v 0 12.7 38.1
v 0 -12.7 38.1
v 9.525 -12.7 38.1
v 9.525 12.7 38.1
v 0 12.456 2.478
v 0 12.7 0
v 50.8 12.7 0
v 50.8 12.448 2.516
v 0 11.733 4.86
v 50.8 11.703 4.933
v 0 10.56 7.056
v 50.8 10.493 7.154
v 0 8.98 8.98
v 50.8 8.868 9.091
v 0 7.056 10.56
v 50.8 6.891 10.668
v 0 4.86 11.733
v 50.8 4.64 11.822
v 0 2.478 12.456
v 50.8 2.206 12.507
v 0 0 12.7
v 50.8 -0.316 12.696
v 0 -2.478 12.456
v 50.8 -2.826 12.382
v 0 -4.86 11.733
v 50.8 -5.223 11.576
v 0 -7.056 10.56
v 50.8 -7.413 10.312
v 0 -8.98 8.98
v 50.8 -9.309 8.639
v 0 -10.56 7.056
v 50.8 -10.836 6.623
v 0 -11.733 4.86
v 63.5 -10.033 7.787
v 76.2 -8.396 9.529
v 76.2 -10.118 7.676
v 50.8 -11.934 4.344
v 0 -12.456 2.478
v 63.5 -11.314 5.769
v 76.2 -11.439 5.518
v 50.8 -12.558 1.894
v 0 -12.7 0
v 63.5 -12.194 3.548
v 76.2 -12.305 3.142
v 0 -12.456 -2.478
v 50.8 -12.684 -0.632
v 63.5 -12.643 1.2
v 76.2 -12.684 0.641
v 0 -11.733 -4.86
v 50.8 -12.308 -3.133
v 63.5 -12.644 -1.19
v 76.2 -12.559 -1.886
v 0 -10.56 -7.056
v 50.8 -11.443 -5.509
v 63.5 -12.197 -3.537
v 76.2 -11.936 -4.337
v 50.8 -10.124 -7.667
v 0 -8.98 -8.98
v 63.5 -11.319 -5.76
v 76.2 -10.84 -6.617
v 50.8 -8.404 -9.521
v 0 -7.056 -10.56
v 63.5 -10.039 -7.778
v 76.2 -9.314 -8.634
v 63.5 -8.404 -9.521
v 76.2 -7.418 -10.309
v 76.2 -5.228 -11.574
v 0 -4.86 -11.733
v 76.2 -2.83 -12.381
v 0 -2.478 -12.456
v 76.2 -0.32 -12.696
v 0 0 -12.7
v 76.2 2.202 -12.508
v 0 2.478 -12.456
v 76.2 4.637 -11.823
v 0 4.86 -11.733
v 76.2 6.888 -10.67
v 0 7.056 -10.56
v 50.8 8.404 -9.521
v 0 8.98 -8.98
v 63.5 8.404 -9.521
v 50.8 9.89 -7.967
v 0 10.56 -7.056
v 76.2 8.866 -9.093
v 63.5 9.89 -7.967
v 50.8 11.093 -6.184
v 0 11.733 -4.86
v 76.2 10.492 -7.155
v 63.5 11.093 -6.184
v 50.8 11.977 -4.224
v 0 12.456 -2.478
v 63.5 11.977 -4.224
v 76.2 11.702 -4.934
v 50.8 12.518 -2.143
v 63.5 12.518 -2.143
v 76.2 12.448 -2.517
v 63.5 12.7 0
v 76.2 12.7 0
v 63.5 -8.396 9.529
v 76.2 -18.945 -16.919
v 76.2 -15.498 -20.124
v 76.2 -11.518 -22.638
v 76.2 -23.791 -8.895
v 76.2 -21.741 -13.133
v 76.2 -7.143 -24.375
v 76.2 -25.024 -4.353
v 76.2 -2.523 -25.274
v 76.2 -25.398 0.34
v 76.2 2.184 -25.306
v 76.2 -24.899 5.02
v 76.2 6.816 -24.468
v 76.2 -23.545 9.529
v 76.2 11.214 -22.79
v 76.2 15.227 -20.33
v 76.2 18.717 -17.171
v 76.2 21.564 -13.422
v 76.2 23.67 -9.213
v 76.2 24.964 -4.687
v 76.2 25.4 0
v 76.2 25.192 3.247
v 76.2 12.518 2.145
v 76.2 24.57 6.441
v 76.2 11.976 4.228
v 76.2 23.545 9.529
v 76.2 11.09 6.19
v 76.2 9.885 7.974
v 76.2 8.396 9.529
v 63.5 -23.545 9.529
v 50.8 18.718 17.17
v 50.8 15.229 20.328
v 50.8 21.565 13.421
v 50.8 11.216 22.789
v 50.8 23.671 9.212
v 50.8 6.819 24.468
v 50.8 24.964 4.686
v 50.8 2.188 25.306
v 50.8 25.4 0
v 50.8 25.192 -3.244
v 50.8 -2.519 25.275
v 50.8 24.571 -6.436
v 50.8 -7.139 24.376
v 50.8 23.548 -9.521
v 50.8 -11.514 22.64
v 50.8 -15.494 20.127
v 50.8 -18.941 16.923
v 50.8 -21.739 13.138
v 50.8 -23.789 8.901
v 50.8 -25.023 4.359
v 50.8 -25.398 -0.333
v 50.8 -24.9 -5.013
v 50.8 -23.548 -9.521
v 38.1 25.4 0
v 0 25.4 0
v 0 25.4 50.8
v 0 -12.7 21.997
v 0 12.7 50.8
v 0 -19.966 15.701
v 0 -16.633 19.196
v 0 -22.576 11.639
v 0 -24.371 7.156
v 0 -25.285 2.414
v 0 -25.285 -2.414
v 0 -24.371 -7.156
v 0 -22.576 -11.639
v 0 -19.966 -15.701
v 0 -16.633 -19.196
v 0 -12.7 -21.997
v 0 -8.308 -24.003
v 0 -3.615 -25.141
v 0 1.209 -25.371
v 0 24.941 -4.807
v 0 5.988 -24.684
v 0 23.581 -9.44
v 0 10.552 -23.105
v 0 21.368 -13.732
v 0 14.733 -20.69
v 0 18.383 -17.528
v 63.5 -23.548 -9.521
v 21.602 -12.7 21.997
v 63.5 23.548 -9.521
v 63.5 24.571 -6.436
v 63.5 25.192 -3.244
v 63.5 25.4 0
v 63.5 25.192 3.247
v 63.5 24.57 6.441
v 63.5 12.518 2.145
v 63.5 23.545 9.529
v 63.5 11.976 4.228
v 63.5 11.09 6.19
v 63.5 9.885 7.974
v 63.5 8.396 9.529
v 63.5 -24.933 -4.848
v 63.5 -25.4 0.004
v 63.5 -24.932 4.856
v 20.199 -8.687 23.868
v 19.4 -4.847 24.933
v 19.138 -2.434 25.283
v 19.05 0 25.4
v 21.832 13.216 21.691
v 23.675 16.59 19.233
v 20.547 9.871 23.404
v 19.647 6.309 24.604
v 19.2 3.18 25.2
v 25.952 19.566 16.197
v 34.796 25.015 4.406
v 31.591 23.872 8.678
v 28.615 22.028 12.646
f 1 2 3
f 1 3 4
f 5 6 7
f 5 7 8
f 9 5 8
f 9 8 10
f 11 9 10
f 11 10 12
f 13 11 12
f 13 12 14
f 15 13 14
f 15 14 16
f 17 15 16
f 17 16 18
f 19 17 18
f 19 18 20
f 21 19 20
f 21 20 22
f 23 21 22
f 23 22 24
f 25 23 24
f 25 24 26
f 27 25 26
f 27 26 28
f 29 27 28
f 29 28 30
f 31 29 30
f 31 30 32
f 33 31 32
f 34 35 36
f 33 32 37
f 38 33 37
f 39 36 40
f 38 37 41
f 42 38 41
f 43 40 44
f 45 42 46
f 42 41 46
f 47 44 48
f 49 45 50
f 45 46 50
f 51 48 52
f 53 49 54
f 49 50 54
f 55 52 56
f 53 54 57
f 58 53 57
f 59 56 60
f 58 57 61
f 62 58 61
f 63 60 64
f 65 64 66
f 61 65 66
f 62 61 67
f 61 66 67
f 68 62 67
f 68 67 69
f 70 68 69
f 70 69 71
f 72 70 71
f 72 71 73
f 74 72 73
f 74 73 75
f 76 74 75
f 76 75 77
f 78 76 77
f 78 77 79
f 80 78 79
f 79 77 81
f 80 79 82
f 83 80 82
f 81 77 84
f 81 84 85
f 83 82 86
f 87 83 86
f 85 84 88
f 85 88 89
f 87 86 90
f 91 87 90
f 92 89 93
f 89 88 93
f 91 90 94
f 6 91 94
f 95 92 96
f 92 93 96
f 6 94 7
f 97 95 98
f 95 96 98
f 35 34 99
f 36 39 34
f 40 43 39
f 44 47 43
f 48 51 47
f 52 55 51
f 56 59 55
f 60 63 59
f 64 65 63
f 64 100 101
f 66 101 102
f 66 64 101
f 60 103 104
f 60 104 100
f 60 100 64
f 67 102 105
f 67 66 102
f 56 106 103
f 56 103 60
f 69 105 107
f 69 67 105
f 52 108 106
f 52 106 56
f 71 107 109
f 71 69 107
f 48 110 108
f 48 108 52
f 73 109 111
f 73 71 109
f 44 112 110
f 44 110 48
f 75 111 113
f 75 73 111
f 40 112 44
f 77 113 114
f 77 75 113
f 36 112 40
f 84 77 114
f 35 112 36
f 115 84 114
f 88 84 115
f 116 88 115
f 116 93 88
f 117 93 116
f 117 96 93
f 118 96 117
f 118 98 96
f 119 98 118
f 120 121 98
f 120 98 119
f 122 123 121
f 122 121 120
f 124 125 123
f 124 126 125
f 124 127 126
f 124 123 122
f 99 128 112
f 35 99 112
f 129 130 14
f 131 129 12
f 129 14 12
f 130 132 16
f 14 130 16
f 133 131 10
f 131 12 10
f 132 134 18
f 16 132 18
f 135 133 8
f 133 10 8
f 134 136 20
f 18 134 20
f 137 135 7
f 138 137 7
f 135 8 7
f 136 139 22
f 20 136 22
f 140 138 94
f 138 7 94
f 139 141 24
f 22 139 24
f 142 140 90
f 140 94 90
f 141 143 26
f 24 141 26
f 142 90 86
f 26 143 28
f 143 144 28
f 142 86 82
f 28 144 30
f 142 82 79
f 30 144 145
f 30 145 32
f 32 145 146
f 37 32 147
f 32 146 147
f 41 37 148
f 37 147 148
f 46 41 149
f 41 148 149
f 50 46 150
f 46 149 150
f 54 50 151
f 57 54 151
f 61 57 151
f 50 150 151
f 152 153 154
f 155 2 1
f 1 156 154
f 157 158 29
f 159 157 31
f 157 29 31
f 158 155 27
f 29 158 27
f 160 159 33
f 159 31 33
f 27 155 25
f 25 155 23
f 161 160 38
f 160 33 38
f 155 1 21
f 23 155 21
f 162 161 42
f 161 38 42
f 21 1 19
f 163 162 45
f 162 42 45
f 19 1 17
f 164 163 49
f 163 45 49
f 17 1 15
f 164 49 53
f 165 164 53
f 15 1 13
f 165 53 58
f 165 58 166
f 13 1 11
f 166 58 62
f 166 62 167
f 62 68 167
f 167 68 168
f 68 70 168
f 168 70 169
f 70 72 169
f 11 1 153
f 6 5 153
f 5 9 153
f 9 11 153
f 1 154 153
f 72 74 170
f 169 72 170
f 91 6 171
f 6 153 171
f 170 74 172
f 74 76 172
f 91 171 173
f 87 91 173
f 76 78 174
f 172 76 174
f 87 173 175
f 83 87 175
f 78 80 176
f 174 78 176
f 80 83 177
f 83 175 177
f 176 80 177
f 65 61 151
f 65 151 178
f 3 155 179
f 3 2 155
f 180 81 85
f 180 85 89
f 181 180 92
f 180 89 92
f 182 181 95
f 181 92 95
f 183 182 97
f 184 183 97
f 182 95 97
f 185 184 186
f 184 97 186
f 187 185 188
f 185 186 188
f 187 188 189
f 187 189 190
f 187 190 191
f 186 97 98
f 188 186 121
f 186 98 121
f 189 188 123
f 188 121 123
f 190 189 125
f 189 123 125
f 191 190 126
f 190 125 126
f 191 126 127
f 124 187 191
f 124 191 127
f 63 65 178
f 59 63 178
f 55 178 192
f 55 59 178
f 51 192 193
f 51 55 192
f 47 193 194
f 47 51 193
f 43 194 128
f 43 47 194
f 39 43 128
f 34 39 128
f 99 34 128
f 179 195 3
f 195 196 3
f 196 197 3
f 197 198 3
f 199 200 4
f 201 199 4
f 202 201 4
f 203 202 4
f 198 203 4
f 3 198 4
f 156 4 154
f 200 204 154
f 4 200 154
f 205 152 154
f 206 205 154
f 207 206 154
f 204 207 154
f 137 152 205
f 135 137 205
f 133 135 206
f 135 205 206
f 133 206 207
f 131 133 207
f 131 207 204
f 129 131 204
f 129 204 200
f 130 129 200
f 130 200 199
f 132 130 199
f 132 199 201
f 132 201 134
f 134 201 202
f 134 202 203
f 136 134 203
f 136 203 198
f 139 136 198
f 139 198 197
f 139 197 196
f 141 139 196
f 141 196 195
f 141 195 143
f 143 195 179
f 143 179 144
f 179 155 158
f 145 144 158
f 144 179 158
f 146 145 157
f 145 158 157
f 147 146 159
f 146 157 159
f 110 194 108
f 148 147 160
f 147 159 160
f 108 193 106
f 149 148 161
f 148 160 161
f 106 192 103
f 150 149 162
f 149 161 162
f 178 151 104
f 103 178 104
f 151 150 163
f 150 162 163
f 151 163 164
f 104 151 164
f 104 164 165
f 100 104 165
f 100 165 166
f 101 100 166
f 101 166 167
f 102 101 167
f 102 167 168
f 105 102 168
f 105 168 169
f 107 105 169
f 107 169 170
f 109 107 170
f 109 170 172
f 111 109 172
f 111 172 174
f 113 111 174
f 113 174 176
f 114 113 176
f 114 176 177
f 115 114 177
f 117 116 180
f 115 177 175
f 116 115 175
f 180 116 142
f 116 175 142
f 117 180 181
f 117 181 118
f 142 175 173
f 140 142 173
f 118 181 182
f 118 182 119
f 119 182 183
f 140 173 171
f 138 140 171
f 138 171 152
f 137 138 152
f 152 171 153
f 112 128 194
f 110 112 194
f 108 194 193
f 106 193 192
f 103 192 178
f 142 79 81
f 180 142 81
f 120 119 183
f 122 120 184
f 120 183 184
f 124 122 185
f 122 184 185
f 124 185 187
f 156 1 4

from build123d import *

# Parameters (mm, degrees)
F0_R           = 25.4
F0_R_2         = 12.7
F1_DEPTH       = 76.2
F4_DEPTH       = 25.4
F4_DEPTH_BACK  = 12.7
F5_R           = 12.7
F6_DEPTH       = 76.201
F7_W           = 25.4
F7_H           = 12.7
F8_DEPTH       = 76.201
F10_DEPTH      = 25.4
F10_DEPTH_BACK = 25.4


with BuildPart() as f1:
    # F0 (on Right) → F1 (new body)
    with BuildSketch(Plane.YZ):
        Circle(F0_R)
        Circle(F0_R_2, mode=Mode.SUBTRACT)
    extrude(amount=F1_DEPTH)

    # F3 (on Front) → F4 (join, two sides)
    with BuildSketch(Plane.XZ) as f4_sk:
        Polygon((0, 50.8), (0, 0), (38.1, 0), align=None)
    extrude(amount=-F4_DEPTH)
    extrude(f4_sk.sketch, amount=F4_DEPTH_BACK)

    # F5 (on face) → F6 (cut, through all)
    with BuildSketch(Plane.YZ.offset(76.2)):
        Circle(F5_R)
    extrude(amount=-F6_DEPTH, mode=Mode.SUBTRACT)

    # F7 (on face) → F8 (cut, through all)
    with BuildSketch(Plane.YZ):
        with Locations((0, 44.45)):
            Rectangle(F7_W, F7_H)
    extrude(amount=F8_DEPTH, mode=Mode.SUBTRACT)

    # F9 (on Front) → F10 (cut, two sides)
    with BuildSketch(Plane.XZ) as f10_sk:
        Polygon((76.2, 25.4035045986), (50.8, 25.4035045986), (50.8, -9.5214954014), (63.5, -9.5214954014), (63.5, 9.5285045986), (76.2, 9.5285045986), align=None)
    extrude(amount=-F10_DEPTH, mode=Mode.SUBTRACT)
    extrude(f10_sk.sketch, amount=F10_DEPTH_BACK, mode=Mode.SUBTRACT)


solid = f1.part
